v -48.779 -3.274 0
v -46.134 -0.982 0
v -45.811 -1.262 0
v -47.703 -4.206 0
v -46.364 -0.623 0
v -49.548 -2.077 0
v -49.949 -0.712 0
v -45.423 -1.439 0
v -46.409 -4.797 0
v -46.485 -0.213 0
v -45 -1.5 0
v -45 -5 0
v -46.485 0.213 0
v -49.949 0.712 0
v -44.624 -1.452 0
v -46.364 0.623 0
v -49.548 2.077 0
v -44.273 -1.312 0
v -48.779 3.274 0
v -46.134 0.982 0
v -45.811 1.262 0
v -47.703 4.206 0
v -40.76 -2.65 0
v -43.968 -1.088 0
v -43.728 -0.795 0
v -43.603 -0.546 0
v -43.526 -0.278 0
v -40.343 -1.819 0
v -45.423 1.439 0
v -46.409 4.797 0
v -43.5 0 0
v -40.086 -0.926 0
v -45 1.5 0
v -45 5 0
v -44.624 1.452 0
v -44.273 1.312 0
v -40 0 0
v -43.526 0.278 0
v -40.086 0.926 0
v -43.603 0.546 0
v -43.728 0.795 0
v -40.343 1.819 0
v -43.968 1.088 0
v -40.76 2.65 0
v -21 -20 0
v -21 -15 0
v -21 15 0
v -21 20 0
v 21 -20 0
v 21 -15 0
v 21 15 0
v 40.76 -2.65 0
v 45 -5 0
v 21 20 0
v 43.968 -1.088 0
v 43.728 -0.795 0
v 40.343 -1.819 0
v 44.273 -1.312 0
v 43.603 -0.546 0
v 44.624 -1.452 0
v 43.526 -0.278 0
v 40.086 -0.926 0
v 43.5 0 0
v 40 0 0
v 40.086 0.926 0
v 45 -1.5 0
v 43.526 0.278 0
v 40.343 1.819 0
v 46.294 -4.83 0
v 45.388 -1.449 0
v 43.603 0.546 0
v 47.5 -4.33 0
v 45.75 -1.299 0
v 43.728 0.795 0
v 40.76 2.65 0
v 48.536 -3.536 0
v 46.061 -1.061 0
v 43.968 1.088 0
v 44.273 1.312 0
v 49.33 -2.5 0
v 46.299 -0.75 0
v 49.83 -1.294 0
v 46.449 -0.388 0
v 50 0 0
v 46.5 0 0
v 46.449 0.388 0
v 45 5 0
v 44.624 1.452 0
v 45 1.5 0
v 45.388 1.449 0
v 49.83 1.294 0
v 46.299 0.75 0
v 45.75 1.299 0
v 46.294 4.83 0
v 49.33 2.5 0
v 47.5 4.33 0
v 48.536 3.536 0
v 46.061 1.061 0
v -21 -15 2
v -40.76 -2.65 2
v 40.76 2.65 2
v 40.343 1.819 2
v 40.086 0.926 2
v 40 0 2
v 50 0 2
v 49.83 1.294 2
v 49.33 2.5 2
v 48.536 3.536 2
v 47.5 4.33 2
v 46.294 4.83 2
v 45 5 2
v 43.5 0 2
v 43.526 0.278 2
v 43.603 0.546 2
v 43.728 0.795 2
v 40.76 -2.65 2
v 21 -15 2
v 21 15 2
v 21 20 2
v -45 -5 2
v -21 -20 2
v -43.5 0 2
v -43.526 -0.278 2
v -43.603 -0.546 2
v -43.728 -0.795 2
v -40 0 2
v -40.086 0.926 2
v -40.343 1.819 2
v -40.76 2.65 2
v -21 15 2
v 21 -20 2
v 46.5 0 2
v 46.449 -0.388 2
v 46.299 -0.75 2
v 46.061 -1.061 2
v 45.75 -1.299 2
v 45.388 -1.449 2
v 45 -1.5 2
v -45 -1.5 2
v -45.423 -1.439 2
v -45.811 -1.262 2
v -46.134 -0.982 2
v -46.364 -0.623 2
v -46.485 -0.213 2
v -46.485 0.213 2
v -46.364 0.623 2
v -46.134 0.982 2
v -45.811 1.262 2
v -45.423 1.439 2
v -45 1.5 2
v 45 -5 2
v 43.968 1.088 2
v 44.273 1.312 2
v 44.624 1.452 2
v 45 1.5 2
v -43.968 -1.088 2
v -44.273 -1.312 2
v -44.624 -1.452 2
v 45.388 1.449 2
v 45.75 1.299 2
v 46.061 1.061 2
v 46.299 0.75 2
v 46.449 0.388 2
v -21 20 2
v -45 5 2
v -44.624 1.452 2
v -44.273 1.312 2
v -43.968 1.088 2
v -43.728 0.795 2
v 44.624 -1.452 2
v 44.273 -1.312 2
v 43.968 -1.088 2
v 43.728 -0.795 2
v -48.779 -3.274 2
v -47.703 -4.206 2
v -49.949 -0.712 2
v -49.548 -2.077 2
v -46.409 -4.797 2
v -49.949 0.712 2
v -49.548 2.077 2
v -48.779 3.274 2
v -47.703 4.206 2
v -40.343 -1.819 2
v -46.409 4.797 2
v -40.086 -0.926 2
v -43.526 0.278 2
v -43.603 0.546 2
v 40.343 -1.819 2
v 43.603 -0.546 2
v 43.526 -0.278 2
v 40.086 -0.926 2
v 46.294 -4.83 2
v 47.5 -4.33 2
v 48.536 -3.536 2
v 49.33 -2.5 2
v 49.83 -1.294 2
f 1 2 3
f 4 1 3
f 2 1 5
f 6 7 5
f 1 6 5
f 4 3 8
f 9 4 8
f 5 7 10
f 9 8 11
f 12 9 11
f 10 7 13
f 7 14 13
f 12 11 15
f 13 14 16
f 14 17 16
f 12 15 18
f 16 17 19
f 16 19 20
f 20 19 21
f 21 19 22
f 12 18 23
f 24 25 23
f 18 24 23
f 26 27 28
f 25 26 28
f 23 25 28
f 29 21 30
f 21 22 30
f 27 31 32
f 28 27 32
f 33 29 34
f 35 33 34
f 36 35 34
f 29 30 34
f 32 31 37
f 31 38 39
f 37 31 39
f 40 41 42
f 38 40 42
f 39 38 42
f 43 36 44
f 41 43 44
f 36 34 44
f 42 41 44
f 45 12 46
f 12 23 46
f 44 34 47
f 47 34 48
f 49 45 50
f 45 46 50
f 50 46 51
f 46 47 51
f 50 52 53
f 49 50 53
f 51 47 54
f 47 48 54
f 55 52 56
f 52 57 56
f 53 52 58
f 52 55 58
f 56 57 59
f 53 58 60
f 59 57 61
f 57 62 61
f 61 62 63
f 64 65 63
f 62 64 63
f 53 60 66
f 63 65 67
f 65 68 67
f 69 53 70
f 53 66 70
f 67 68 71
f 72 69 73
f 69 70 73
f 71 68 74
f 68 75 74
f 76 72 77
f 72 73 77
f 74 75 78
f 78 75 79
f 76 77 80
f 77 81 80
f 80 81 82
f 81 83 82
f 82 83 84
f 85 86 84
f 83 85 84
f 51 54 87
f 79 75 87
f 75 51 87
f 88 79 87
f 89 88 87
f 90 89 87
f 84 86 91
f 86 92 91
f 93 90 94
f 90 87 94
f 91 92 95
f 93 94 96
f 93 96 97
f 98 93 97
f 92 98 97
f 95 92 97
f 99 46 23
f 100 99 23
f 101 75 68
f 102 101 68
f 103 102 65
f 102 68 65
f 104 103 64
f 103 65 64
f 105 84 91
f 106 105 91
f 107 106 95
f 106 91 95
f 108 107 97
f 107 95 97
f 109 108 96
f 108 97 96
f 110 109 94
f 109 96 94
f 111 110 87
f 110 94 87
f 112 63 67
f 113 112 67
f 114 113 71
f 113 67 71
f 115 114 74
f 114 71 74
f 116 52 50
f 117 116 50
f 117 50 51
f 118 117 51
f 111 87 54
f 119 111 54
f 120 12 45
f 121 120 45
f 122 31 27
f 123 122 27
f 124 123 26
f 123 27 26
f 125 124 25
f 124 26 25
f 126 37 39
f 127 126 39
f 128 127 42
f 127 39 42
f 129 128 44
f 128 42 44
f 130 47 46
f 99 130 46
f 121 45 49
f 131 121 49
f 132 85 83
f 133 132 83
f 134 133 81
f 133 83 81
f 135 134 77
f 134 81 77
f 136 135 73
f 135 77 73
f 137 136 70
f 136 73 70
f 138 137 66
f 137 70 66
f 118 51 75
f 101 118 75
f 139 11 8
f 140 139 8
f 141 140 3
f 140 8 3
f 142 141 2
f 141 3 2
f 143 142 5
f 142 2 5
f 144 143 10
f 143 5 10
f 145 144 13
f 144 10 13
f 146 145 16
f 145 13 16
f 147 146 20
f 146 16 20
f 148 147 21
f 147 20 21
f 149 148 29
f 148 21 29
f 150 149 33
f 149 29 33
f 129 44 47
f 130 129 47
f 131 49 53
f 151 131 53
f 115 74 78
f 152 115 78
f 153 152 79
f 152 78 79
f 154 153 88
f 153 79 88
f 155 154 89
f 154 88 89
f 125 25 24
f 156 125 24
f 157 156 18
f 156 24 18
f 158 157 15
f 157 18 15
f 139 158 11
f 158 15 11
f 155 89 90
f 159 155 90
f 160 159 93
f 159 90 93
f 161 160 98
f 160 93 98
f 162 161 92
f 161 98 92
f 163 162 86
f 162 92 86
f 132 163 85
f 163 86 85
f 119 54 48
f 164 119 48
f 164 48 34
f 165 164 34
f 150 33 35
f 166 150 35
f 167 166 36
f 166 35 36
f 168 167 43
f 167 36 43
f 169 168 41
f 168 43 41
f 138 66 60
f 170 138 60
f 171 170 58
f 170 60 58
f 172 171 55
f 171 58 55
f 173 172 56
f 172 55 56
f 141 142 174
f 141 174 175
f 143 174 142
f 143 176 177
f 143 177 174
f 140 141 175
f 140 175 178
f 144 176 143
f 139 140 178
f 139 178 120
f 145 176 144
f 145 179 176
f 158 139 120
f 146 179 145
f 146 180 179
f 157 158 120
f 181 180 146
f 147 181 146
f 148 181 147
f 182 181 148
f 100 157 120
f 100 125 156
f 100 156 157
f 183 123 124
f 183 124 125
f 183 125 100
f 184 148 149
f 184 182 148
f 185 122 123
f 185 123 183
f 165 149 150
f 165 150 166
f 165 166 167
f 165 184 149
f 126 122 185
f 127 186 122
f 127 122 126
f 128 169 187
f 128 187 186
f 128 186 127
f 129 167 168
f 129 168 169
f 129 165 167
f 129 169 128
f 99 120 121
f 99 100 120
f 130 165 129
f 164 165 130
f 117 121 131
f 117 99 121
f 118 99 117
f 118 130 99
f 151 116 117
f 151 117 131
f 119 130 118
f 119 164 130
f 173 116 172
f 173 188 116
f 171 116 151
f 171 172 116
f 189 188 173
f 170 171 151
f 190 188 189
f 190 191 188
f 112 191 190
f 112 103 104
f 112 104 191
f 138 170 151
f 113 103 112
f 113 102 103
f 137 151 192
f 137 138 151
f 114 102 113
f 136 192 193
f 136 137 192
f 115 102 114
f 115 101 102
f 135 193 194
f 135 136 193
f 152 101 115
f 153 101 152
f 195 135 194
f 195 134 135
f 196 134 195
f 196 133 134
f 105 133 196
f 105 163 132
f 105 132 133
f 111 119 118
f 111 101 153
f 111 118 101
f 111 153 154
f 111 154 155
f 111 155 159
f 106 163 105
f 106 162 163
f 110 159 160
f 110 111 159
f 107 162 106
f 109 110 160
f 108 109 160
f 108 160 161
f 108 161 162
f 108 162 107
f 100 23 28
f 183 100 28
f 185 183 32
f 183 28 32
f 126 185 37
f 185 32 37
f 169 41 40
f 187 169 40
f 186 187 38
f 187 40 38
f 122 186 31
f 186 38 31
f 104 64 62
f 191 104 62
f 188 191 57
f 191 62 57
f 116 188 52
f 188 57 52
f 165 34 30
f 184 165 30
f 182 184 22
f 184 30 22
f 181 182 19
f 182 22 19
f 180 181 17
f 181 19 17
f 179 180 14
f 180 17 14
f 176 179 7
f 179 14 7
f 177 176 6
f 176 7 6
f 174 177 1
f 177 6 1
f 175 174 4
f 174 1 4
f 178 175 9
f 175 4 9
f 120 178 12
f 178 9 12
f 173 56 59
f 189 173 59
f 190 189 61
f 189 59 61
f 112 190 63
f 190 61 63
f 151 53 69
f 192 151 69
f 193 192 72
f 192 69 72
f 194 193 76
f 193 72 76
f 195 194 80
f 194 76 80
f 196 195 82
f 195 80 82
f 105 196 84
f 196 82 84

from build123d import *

# Parameters (mm, degrees)
F0_W     = 6
F0_H     = 5
F0_W_2   = 30
F1_DEPTH = 2


with BuildPart() as f1:
    # F0 (on Top) → F1 (new body)
    with BuildSketch(Plane.XY):
        with BuildLine():
            ThreePointArc((-45, -1.5), (-46.5, 0), (-45, 1.5))
            Line((-45, 1.5), (-45, 5))
            ThreePointArc((-45, 5), (-50, 0), (-45, -5))
            Line((-45, -5), (-45, -1.5))
        make_face()
        with BuildLine():
            ThreePointArc((-45, 5), (-42.576157338, 4.3732124062), (-40.76000848, 2.6499947))
            Line((-40.76000848, 2.6499947), (-21, 15))
            Line((-21, 15), (-21, 20))
            Line((-21, 20), (-45, 5))
        make_face()
        with BuildLine():
            Line((-21, -15), (-40.76000848, -2.6499947))
            ThreePointArc((-40.76000848, -2.6499947), (-42.576157338, -4.3732124062), (-45, -5))
            Line((-45, -5), (-21, -20))
            Line((-21, -20), (-21, -15))
        make_face()
        with BuildLine():
            ThreePointArc((50, 0), (48.5355339059, 3.5355339059), (45, 5))
            Line((45, 5), (45, 1.5))
            ThreePointArc((45, 1.5), (46.0606601718, 1.0606601718), (46.5, 0))
            ThreePointArc((46.5, 0), (46.0606601718, -1.0606601718), (45, -1.5))
            Line((45, -1.5), (45, -5))
            ThreePointArc((45, -5), (48.5355339059, -3.5355339059), (50, 0))
        make_face()
        with BuildLine():
            Line((21, 20), (21, 15))
            Line((21, 15), (40.76000848, 2.6499947))
            ThreePointArc((40.76000848, 2.6499947), (42.576157338, 4.3732124062), (45, 5))
            Line((45, 5), (21, 20))
        make_face()
        with BuildLine():
            Line((40.76000848, -2.6499947), (21, -15))
            Line((21, -15), (21, -20))
            Line((21, -20), (45, -5))
            ThreePointArc((45, -5), (42.576157338, -4.3732124062), (40.76000848, -2.6499947))
        make_face()
        with Locations((-18, 17.5)):
            Rectangle(F0_W, F0_H)
        with Locations((0, 17.5)):
            Rectangle(F0_W_2, F0_H)
        with Locations((18, 17.5)):
            Rectangle(F0_W, F0_H)
        with BuildLine():
            ThreePointArc((-45, 1.5), (-44.2728472014, 1.3119637219), (-43.728002544, 0.79499841))
            Line((-43.728002544, 0.79499841), (-40.76000848, 2.6499947))
            ThreePointArc((-40.76000848, 2.6499947), (-42.576157338, 4.3732124062), (-45, 5))
            Line((-45, 5), (-45, 1.5))
        make_face()
        with BuildLine():
            Line((-40.76000848, -2.6499947), (-43.728002544, -0.79499841))
            ThreePointArc((-43.728002544, -0.79499841), (-44.2728472014, -1.3119637219), (-45, -1.5))
            Line((-45, -1.5), (-45, -5))
            ThreePointArc((-45, -5), (-42.576157338, -4.3732124062), (-40.76000848, -2.6499947))
        make_face()
        with BuildLine():
            ThreePointArc((45, 5), (42.576157338, 4.3732124062), (40.76000848, 2.6499947))
            Line((40.76000848, 2.6499947), (43.728002544, 0.79499841))
            ThreePointArc((43.728002544, 0.79499841), (44.2728472014, 1.3119637219), (45, 1.5))
            Line((45, 1.5), (45, 5))
        make_face()
        with BuildLine():
            Line((43.728002544, -0.79499841), (40.76000848, -2.6499947))
            ThreePointArc((40.76000848, -2.6499947), (42.576157338, -4.3732124062), (45, -5))
            Line((45, -5), (45, -1.5))
            ThreePointArc((45, -1.5), (44.2728472014, -1.3119637219), (43.728002544, -0.79499841))
        make_face()
        with Locations((-18, -17.5)):
            Rectangle(F0_W, F0_H)
        with Locations((18, -17.5)):
            Rectangle(F0_W, F0_H)
        with BuildLine():
            ThreePointArc((-43.728002544, 0.79499841), (-43.5581268808, 0.4135237696), (-43.5, 0))
            Line((-43.5, 0), (-40, 0))
            ThreePointArc((-40, 0), (-40.1937562692, 1.3784125652), (-40.76000848, 2.6499947))
            Line((-40.76000848, 2.6499947), (-43.728002544, 0.79499841))
        make_face()
        with BuildLine():
            Line((-40, 0), (-43.5, 0))
            ThreePointArc((-43.5, 0), (-43.5581268808, -0.4135237696), (-43.728002544, -0.79499841))
            Line((-43.728002544, -0.79499841), (-40.76000848, -2.6499947))
            ThreePointArc((-40.76000848, -2.6499947), (-40.1937562692, -1.3784125652), (-40, 0))
        make_face()
        with BuildLine():
            ThreePointArc((40.76000848, 2.6499947), (40.1937562692, 1.3784125652), (40, 0))
            Line((40, 0), (43.5, 0))
            ThreePointArc((43.5, 0), (43.5581268808, 0.4135237696), (43.728002544, 0.79499841))
            Line((43.728002544, 0.79499841), (40.76000848, 2.6499947))
        make_face()
        with BuildLine():
            Line((43.5, 0), (40, 0))
            ThreePointArc((40, 0), (40.1937562692, -1.3784125652), (40.76000848, -2.6499947))
            Line((40.76000848, -2.6499947), (43.728002544, -0.79499841))
            ThreePointArc((43.728002544, -0.79499841), (43.5581268808, -0.4135237696), (43.5, 0))
        make_face()
        Polygon((-21, 15), (-21, 0), (21, 0), (21, 15), (15, 15), (-15, 15), align=None)
        Polygon((21, 0), (-21, 0), (-21, -15), (-15, -15), (15, -15), (21, -15), align=None)
        with Locations((0, -17.5)):
            Rectangle(F0_W_2, F0_H)
    extrude(amount=F1_DEPTH)


solid = f1.part
